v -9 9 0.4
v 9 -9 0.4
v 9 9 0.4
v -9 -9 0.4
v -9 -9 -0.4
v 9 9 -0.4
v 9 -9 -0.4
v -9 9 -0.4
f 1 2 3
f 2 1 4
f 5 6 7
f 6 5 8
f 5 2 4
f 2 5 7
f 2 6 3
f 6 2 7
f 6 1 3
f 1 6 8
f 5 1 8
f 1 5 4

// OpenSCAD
// Printed circuit board: 18.0mm x 18.0mm x 0.8mm
// Single connected solid (plain PCB slab)

length = 18.0;     // mm
width  = 18.0;     // mm
thickness = 0.8;   // mm

$fn = 64;

module pcb_board(l=length, w=width, t=thickness) {
    // Centered for unambiguous dimensions in all views
    color([0.0, 0.4, 0.2])
        cube([l, w, t], center=true);
}

pcb_board();
